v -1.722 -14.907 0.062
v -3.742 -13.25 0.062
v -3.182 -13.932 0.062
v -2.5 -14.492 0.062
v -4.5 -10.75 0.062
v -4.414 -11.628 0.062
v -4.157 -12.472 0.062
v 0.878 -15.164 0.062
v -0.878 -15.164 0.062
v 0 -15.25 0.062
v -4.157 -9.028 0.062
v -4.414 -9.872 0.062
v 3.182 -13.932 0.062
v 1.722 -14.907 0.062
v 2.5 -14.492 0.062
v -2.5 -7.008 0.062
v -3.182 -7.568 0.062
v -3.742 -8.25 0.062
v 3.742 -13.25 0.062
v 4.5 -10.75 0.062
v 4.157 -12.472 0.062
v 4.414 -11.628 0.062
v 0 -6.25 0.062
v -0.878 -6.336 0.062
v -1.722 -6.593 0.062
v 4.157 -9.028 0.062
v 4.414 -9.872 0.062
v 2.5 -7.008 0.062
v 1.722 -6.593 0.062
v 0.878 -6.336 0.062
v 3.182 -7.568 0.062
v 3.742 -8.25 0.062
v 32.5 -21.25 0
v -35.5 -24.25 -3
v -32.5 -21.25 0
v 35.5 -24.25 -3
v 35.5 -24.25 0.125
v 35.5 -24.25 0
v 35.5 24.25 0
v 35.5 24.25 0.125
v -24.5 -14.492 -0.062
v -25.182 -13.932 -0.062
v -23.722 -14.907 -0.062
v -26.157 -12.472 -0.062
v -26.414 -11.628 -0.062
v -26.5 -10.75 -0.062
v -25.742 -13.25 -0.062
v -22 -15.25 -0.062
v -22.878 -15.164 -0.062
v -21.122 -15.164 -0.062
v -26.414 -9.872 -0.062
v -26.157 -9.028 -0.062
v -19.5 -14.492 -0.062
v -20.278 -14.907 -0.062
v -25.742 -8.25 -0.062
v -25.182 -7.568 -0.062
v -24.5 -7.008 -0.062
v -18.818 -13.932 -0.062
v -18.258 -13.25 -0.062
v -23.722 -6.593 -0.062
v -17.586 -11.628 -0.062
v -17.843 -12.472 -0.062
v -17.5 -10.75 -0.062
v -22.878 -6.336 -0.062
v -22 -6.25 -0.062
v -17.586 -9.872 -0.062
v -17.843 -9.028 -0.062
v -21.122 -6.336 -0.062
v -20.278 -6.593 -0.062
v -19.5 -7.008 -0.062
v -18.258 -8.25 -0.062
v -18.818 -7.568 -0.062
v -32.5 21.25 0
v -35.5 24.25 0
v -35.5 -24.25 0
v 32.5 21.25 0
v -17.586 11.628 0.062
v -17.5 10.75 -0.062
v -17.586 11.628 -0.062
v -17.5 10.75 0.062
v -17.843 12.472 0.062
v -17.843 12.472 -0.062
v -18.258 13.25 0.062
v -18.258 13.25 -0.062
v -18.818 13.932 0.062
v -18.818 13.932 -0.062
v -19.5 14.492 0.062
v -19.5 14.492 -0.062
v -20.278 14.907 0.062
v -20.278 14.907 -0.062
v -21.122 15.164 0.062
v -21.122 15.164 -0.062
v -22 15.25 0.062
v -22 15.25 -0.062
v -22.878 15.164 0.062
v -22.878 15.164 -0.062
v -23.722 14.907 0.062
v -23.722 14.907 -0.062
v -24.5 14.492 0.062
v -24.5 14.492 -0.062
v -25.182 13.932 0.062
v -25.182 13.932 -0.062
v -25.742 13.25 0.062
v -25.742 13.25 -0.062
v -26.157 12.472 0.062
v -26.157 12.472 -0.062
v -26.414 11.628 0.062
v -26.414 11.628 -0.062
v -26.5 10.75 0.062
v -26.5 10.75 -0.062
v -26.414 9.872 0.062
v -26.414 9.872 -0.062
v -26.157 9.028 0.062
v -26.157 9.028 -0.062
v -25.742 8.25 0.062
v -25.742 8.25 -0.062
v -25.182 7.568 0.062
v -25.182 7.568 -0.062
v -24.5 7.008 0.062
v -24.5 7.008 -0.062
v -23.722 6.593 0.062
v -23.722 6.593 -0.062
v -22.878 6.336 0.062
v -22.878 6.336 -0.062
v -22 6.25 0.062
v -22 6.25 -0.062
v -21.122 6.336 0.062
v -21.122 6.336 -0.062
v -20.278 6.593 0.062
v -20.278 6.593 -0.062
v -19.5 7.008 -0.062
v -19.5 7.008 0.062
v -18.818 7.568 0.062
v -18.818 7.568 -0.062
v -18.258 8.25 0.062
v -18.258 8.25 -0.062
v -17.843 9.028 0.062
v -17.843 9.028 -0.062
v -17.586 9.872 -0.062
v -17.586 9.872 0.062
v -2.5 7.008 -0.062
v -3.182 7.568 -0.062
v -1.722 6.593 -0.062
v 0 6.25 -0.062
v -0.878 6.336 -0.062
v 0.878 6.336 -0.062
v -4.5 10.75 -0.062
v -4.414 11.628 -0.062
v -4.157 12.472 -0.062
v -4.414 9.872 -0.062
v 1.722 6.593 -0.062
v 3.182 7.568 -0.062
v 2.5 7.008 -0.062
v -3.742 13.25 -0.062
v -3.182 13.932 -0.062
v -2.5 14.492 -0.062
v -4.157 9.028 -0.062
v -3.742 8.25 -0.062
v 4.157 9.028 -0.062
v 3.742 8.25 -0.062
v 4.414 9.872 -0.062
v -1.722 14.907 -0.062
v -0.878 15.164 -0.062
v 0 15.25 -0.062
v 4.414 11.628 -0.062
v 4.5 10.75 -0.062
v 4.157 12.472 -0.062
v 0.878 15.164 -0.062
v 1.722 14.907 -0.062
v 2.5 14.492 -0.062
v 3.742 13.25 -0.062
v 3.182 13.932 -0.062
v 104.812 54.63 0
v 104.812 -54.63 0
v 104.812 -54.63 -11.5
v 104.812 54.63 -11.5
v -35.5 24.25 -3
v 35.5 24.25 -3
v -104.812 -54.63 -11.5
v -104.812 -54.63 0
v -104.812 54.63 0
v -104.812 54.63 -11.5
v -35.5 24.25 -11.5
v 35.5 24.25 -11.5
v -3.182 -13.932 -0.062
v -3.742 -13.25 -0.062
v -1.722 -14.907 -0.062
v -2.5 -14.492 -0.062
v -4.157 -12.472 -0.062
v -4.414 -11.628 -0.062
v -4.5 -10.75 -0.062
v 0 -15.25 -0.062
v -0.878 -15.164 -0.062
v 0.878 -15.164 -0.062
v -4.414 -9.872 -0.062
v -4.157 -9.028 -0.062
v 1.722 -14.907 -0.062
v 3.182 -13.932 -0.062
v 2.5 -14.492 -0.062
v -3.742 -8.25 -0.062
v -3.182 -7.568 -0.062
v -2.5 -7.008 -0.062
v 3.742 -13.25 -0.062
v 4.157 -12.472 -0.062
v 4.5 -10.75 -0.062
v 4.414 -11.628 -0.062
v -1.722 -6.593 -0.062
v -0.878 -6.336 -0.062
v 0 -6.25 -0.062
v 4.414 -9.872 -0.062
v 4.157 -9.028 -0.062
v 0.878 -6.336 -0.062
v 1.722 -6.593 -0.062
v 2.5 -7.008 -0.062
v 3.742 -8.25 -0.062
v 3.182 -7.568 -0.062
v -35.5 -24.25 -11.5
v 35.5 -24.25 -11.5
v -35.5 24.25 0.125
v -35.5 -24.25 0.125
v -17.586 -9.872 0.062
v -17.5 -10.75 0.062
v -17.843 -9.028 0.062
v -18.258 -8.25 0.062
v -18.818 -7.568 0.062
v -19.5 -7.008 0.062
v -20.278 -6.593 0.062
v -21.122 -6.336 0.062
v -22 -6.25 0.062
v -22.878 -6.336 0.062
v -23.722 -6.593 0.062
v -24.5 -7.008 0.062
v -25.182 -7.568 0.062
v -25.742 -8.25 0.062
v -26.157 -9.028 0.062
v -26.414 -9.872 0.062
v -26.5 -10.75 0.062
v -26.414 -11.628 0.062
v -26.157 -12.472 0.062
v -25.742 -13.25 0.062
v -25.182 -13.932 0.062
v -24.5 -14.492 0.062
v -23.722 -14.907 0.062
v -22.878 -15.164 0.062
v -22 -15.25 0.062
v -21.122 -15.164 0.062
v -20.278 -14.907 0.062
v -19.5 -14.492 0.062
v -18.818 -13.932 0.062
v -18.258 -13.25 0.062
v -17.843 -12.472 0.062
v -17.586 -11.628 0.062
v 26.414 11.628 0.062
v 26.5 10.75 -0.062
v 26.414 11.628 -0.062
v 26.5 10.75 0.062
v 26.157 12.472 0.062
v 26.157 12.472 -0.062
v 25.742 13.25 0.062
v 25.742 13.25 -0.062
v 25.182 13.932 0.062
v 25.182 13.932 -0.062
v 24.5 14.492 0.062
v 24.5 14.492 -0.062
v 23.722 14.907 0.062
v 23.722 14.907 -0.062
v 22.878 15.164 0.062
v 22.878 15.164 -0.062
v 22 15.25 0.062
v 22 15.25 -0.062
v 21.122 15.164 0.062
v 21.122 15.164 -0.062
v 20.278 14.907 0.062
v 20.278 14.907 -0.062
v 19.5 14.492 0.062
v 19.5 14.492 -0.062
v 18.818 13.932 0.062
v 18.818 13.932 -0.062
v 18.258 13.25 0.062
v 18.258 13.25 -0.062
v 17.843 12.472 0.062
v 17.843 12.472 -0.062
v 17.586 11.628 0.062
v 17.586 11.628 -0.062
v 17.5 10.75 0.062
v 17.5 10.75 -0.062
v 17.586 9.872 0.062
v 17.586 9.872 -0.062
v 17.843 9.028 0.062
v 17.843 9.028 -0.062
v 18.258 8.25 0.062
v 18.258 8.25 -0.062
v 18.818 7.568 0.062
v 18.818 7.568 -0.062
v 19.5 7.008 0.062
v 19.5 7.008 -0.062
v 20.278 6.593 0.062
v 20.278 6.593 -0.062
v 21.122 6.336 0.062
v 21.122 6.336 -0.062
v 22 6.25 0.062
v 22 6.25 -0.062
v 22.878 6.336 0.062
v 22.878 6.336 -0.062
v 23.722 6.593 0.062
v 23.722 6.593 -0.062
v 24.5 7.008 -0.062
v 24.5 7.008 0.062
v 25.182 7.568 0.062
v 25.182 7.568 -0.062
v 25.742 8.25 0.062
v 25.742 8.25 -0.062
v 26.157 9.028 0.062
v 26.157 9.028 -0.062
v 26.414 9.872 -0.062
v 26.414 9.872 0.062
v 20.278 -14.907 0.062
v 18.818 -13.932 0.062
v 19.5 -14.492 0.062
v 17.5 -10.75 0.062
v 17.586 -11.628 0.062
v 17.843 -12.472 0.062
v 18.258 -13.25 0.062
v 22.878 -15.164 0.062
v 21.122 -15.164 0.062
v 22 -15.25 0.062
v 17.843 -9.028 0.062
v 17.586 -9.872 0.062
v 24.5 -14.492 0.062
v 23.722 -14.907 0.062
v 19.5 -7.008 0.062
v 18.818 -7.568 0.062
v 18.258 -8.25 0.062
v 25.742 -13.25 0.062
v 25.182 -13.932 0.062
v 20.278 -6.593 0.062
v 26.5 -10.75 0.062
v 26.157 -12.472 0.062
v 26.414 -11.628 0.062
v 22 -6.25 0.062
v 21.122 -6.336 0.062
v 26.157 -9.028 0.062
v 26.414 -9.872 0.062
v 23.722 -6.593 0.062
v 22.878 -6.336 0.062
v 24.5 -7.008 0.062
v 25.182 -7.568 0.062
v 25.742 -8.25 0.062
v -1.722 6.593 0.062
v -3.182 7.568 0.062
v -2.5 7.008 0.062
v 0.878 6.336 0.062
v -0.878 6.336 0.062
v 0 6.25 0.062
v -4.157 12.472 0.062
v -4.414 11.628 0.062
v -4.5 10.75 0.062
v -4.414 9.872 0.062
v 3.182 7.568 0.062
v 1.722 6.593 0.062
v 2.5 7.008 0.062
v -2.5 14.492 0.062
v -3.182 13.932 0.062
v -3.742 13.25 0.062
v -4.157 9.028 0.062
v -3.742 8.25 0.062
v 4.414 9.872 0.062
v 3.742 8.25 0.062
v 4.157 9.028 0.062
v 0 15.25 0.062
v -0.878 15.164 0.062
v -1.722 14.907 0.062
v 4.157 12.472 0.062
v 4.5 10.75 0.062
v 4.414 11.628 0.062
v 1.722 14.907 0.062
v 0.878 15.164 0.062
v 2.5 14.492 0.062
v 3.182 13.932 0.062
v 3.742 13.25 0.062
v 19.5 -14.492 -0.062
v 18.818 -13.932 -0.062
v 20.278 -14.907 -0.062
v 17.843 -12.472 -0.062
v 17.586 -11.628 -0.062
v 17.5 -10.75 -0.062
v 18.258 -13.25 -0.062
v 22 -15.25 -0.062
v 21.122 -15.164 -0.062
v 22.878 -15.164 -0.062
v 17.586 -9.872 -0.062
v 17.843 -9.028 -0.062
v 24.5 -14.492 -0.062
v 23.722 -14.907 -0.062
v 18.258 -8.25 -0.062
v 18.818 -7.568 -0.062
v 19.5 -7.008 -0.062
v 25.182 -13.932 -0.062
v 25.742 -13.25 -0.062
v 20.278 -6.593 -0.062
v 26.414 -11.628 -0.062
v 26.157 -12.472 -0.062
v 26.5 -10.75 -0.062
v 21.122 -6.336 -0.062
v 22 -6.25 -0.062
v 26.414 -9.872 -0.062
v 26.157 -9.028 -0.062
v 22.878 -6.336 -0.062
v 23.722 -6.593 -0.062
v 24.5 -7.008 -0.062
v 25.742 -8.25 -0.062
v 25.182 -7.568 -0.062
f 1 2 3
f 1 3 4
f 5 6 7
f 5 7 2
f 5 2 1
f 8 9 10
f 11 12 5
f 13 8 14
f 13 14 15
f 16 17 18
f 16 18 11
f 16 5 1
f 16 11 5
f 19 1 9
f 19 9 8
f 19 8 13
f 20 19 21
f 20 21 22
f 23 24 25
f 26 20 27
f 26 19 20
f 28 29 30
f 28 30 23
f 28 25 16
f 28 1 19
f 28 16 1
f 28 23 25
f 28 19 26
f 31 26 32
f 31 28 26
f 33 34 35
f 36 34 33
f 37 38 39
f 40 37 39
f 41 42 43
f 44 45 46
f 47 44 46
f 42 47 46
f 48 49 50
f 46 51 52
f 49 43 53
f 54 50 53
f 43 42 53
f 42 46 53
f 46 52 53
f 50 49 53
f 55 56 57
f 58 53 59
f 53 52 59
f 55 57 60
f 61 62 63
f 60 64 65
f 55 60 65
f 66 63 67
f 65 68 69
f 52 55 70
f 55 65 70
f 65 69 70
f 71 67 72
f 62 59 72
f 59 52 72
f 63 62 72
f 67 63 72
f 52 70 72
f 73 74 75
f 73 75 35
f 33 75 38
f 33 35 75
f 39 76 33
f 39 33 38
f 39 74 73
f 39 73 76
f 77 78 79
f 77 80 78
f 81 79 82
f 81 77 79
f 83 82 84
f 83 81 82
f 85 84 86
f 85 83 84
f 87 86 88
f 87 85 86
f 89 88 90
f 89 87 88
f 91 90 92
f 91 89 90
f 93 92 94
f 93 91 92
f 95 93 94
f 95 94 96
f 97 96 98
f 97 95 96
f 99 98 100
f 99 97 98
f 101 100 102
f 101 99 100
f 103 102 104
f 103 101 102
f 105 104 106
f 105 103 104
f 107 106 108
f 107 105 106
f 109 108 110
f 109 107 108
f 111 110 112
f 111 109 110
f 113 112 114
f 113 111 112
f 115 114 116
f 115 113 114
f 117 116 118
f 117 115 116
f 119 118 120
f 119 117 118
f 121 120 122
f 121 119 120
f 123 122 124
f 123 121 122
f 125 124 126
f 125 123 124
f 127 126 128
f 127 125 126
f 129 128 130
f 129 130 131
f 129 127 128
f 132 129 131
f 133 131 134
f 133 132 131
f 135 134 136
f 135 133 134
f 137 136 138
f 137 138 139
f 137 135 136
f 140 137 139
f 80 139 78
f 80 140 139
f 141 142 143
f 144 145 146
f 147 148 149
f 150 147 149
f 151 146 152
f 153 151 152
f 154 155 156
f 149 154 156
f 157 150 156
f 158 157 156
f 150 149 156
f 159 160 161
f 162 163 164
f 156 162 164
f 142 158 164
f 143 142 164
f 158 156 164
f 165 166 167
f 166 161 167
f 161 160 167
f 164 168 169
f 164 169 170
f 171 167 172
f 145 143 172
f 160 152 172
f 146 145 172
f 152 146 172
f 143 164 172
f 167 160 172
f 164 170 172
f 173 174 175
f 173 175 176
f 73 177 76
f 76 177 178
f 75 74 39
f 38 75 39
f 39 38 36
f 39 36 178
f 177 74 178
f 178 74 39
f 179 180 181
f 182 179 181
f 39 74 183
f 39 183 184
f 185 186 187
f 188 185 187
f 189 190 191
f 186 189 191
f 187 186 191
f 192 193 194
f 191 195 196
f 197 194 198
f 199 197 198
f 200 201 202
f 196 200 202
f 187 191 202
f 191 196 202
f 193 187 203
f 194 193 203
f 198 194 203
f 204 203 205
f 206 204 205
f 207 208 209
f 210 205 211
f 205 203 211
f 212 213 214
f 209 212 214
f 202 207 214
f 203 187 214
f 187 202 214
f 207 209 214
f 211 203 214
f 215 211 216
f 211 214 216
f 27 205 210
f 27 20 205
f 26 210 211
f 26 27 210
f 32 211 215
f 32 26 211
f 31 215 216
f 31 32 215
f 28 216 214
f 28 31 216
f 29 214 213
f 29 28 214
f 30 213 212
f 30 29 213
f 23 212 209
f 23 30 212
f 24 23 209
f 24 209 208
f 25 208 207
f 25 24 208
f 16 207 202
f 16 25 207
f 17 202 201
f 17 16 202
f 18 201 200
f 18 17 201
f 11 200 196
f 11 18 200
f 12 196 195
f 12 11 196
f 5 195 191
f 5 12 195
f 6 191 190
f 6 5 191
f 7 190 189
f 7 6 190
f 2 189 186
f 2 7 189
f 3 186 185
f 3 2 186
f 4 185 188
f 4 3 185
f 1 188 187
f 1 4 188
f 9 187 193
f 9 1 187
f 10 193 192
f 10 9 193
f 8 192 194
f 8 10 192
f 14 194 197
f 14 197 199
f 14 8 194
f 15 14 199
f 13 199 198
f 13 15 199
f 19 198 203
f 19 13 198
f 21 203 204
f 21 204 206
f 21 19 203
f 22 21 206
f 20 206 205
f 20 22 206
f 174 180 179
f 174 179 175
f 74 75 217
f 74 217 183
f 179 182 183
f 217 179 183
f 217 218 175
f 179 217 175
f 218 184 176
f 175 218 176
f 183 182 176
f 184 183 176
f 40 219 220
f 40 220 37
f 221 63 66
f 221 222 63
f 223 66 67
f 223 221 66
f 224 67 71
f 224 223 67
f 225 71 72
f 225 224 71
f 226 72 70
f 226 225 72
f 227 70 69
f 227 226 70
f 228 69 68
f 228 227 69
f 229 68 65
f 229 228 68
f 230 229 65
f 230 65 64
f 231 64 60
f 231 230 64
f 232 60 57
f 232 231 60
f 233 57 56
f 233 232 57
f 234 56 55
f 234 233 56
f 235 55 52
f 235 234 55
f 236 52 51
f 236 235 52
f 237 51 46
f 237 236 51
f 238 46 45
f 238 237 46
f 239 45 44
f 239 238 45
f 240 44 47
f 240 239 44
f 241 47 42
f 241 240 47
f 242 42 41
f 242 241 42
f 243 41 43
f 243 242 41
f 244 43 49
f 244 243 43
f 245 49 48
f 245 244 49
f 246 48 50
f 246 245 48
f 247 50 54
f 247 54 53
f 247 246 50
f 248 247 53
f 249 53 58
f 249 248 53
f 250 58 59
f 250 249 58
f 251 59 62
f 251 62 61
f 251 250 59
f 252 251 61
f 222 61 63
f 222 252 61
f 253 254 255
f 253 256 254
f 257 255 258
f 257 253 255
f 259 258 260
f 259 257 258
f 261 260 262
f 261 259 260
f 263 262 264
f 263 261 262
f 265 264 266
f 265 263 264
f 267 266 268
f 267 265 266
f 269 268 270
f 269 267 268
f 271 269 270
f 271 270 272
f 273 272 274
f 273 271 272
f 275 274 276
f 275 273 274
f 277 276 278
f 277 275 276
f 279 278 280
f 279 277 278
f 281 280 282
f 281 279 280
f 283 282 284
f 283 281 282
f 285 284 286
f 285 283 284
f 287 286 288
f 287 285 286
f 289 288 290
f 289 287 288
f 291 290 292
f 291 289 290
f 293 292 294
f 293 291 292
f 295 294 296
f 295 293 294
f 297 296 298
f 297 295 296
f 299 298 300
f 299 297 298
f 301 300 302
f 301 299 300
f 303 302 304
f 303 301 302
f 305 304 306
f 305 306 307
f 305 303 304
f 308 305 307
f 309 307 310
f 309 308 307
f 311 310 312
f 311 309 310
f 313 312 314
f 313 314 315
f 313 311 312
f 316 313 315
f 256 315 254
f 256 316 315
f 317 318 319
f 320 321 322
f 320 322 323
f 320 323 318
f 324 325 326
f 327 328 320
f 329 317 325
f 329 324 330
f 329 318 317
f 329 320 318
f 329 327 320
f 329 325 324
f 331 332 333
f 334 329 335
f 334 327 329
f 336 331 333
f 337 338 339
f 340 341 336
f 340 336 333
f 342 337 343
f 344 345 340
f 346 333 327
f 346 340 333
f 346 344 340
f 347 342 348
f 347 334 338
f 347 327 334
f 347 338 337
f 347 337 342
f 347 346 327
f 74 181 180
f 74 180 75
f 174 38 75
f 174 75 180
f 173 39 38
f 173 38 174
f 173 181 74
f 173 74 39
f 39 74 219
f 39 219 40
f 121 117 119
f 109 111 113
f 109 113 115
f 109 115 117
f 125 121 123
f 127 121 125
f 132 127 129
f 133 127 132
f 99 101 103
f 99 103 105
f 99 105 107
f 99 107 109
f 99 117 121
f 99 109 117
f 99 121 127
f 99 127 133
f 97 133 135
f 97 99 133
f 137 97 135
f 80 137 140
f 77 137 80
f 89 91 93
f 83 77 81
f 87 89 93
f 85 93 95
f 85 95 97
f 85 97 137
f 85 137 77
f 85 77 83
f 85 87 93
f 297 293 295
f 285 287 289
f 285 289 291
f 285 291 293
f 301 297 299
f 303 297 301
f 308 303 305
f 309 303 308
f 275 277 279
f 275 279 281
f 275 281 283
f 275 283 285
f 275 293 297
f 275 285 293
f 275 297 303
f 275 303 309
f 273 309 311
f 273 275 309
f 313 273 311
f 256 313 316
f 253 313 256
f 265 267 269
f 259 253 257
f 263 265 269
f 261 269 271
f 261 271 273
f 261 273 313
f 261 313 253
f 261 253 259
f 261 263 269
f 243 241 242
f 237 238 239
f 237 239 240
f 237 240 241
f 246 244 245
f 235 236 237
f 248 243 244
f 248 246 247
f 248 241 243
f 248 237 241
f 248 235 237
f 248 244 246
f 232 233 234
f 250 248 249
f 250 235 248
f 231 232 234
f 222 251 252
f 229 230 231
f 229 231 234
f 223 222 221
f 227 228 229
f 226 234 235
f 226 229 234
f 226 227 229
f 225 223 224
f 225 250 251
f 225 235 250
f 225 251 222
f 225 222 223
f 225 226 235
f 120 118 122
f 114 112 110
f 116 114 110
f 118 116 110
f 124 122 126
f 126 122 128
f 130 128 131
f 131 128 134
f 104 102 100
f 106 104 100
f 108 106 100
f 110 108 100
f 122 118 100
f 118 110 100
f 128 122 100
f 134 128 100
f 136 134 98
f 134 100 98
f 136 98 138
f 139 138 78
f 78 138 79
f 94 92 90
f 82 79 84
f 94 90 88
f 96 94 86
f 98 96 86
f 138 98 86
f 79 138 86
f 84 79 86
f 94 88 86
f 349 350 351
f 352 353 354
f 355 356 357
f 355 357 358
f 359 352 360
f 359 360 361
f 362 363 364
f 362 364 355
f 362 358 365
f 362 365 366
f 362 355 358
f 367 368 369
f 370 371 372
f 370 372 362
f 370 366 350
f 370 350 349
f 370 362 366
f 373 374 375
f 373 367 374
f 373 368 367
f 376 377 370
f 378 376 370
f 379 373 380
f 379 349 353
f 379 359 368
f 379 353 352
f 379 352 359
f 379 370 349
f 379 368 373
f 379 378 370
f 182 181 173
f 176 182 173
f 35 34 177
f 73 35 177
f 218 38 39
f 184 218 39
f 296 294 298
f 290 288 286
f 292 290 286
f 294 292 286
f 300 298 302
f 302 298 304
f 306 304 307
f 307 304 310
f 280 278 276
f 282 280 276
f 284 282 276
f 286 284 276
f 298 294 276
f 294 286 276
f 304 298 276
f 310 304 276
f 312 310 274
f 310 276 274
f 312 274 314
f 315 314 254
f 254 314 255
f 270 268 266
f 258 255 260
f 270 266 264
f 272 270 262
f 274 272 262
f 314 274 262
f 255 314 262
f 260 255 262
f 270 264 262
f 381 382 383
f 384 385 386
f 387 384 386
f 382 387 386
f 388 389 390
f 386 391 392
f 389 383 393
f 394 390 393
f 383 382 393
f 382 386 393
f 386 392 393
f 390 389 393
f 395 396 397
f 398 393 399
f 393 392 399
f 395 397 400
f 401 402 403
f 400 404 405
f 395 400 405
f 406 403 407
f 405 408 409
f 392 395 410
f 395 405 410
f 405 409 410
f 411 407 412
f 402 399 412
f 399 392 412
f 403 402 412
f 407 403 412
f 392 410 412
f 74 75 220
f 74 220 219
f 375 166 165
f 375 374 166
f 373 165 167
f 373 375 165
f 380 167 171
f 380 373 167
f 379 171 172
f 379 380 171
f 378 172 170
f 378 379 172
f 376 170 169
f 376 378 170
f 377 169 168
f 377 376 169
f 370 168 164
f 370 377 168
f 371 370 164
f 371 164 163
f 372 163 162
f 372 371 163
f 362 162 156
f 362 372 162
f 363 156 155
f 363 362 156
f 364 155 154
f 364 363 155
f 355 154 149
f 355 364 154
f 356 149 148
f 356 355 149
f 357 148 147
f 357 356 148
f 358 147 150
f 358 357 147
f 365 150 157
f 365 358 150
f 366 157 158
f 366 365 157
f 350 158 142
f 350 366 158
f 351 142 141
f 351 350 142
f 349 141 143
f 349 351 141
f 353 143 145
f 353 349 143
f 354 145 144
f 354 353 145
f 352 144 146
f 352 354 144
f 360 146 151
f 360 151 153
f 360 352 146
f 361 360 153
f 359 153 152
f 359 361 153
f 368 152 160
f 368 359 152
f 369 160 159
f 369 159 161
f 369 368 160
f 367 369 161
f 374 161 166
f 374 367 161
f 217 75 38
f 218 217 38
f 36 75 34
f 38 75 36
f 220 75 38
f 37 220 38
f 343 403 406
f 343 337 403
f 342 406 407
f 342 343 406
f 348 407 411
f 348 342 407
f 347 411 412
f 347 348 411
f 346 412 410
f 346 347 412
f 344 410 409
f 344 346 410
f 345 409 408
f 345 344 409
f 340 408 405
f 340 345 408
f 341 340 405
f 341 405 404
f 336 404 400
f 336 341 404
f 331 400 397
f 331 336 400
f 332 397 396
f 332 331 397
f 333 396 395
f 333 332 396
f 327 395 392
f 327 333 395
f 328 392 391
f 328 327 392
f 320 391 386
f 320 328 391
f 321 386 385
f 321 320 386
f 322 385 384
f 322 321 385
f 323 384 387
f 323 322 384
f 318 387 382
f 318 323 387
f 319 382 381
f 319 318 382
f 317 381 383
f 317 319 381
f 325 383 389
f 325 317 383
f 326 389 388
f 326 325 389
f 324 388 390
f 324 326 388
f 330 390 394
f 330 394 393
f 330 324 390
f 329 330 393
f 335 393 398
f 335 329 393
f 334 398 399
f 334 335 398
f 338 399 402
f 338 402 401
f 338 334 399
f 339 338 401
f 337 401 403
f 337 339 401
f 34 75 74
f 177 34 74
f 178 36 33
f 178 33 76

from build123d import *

# Parameters (mm, degrees)
F0_W     = 209.6243202686
F0_H     = 109.2604249716
F0_W_2   = 71
F0_H_2   = 48.5
F1_DEPTH = 11.5
F0_W_3   = 65
F0_H_3   = 42.5
F0_R     = 4.5
F2_DEPTH = 0.125
F3_DEPTH = 3
F4_SIZE  = 2.99999
F5_DEPTH = 0.0625


# Not quite as in the source:
# - a fillet or chamfer is up to 0.001 mm smaller than in the source, because OpenCascade refuses the exact size


with BuildPart() as f1:
    # F0 (on Top) → F1 (new body)
    with BuildSketch(Plane.XY):
        Rectangle(F0_W, F0_H)
        Rectangle(F0_W_2, F0_H_2, mode=Mode.SUBTRACT)
    extrude(amount=-F1_DEPTH)


with BuildPart() as f2:
    # F0 (on Top) → F2 (new body)
    with BuildSketch(Plane.XY):
        Rectangle(F0_W_2, F0_H_2)
        Rectangle(F0_W_3, F0_H_3, mode=Mode.SUBTRACT)
        Rectangle(F0_W_3, F0_H_3)
        with Locations((-22, -10.75)):
            Circle(F0_R, mode=Mode.SUBTRACT)
        with Locations((0, -10.75)):
            Circle(F0_R, mode=Mode.SUBTRACT)
        with Locations((22, -10.75)):
            Circle(F0_R, mode=Mode.SUBTRACT)
        with Locations((-22, 10.75)):
            Circle(F0_R, mode=Mode.SUBTRACT)
        with Locations((0, 10.75)):
            Circle(F0_R, mode=Mode.SUBTRACT)
        with Locations((22, 10.75)):
            Circle(F0_R, mode=Mode.SUBTRACT)
        with Locations((22, -10.75)):
            Circle(F0_R)
        with Locations((0, -10.75)):
            Circle(F0_R)
        with Locations((-22, -10.75)):
            Circle(F0_R)
        with Locations((-22, 10.75)):
            Circle(F0_R)
        with Locations((0, 10.75)):
            Circle(F0_R)
        with Locations((22, 10.75)):
            Circle(F0_R)
    extrude(amount=F2_DEPTH)


with BuildPart() as f3:
    # F0 (on Top) → F3 (new body)
    with BuildSketch(Plane.XY):
        Rectangle(F0_W_2, F0_H_2)
        Rectangle(F0_W_3, F0_H_3, mode=Mode.SUBTRACT)
    extrude(amount=-F3_DEPTH)

    # F4 (size 3 in the source; OpenCascade refuses exactly that, so slightly less here)
    f4_edges = [f3.edges().sort_by_distance(p)[0] for p in [
        (32.5, 0, -3),
        (0, -21.25, -3),
        (0, 21.25, -3),
        (-32.5, 0, -3),
    ]]
    chamfer(f4_edges, length=F4_SIZE)


with BuildPart() as f5:
    # F0 (on Top) → F5 (new body, symmetric)
    with BuildSketch(Plane.XY):
        with Locations((22, -10.75)):
            Circle(F0_R)
    extrude(amount=F5_DEPTH, both=True)


with BuildPart() as f5b:
    # F0 (on Top) → F5, piece 2 (new body, symmetric)
    with BuildSketch(Plane.XY):
        with Locations((22, 10.75)):
            Circle(F0_R)
    extrude(amount=F5_DEPTH, both=True)


with BuildPart() as f5c:
    # F0 (on Top) → F5, piece 3 (new body, symmetric)
    with BuildSketch(Plane.XY):
        with Locations((0, 10.75)):
            Circle(F0_R)
    extrude(amount=F5_DEPTH, both=True)


with BuildPart() as f5d:
    # F0 (on Top) → F5, piece 4 (new body, symmetric)
    with BuildSketch(Plane.XY):
        with Locations((0, -10.75)):
            Circle(F0_R)
    extrude(amount=F5_DEPTH, both=True)


with BuildPart() as f5e:
    # F0 (on Top) → F5, piece 5 (new body, symmetric)
    with BuildSketch(Plane.XY):
        with Locations((-22, 10.75)):
            Circle(F0_R)
    extrude(amount=F5_DEPTH, both=True)


with BuildPart() as f5f:
    # F0 (on Top) → F5, piece 6 (new body, symmetric)
    with BuildSketch(Plane.XY):
        with Locations((-22, -10.75)):
            Circle(F0_R)
    extrude(amount=F5_DEPTH, both=True)


solid = Compound([f1.part, f2.part, f3.part, f5.part, f5b.part, f5c.part, f5d.part, f5e.part, f5f.part])
